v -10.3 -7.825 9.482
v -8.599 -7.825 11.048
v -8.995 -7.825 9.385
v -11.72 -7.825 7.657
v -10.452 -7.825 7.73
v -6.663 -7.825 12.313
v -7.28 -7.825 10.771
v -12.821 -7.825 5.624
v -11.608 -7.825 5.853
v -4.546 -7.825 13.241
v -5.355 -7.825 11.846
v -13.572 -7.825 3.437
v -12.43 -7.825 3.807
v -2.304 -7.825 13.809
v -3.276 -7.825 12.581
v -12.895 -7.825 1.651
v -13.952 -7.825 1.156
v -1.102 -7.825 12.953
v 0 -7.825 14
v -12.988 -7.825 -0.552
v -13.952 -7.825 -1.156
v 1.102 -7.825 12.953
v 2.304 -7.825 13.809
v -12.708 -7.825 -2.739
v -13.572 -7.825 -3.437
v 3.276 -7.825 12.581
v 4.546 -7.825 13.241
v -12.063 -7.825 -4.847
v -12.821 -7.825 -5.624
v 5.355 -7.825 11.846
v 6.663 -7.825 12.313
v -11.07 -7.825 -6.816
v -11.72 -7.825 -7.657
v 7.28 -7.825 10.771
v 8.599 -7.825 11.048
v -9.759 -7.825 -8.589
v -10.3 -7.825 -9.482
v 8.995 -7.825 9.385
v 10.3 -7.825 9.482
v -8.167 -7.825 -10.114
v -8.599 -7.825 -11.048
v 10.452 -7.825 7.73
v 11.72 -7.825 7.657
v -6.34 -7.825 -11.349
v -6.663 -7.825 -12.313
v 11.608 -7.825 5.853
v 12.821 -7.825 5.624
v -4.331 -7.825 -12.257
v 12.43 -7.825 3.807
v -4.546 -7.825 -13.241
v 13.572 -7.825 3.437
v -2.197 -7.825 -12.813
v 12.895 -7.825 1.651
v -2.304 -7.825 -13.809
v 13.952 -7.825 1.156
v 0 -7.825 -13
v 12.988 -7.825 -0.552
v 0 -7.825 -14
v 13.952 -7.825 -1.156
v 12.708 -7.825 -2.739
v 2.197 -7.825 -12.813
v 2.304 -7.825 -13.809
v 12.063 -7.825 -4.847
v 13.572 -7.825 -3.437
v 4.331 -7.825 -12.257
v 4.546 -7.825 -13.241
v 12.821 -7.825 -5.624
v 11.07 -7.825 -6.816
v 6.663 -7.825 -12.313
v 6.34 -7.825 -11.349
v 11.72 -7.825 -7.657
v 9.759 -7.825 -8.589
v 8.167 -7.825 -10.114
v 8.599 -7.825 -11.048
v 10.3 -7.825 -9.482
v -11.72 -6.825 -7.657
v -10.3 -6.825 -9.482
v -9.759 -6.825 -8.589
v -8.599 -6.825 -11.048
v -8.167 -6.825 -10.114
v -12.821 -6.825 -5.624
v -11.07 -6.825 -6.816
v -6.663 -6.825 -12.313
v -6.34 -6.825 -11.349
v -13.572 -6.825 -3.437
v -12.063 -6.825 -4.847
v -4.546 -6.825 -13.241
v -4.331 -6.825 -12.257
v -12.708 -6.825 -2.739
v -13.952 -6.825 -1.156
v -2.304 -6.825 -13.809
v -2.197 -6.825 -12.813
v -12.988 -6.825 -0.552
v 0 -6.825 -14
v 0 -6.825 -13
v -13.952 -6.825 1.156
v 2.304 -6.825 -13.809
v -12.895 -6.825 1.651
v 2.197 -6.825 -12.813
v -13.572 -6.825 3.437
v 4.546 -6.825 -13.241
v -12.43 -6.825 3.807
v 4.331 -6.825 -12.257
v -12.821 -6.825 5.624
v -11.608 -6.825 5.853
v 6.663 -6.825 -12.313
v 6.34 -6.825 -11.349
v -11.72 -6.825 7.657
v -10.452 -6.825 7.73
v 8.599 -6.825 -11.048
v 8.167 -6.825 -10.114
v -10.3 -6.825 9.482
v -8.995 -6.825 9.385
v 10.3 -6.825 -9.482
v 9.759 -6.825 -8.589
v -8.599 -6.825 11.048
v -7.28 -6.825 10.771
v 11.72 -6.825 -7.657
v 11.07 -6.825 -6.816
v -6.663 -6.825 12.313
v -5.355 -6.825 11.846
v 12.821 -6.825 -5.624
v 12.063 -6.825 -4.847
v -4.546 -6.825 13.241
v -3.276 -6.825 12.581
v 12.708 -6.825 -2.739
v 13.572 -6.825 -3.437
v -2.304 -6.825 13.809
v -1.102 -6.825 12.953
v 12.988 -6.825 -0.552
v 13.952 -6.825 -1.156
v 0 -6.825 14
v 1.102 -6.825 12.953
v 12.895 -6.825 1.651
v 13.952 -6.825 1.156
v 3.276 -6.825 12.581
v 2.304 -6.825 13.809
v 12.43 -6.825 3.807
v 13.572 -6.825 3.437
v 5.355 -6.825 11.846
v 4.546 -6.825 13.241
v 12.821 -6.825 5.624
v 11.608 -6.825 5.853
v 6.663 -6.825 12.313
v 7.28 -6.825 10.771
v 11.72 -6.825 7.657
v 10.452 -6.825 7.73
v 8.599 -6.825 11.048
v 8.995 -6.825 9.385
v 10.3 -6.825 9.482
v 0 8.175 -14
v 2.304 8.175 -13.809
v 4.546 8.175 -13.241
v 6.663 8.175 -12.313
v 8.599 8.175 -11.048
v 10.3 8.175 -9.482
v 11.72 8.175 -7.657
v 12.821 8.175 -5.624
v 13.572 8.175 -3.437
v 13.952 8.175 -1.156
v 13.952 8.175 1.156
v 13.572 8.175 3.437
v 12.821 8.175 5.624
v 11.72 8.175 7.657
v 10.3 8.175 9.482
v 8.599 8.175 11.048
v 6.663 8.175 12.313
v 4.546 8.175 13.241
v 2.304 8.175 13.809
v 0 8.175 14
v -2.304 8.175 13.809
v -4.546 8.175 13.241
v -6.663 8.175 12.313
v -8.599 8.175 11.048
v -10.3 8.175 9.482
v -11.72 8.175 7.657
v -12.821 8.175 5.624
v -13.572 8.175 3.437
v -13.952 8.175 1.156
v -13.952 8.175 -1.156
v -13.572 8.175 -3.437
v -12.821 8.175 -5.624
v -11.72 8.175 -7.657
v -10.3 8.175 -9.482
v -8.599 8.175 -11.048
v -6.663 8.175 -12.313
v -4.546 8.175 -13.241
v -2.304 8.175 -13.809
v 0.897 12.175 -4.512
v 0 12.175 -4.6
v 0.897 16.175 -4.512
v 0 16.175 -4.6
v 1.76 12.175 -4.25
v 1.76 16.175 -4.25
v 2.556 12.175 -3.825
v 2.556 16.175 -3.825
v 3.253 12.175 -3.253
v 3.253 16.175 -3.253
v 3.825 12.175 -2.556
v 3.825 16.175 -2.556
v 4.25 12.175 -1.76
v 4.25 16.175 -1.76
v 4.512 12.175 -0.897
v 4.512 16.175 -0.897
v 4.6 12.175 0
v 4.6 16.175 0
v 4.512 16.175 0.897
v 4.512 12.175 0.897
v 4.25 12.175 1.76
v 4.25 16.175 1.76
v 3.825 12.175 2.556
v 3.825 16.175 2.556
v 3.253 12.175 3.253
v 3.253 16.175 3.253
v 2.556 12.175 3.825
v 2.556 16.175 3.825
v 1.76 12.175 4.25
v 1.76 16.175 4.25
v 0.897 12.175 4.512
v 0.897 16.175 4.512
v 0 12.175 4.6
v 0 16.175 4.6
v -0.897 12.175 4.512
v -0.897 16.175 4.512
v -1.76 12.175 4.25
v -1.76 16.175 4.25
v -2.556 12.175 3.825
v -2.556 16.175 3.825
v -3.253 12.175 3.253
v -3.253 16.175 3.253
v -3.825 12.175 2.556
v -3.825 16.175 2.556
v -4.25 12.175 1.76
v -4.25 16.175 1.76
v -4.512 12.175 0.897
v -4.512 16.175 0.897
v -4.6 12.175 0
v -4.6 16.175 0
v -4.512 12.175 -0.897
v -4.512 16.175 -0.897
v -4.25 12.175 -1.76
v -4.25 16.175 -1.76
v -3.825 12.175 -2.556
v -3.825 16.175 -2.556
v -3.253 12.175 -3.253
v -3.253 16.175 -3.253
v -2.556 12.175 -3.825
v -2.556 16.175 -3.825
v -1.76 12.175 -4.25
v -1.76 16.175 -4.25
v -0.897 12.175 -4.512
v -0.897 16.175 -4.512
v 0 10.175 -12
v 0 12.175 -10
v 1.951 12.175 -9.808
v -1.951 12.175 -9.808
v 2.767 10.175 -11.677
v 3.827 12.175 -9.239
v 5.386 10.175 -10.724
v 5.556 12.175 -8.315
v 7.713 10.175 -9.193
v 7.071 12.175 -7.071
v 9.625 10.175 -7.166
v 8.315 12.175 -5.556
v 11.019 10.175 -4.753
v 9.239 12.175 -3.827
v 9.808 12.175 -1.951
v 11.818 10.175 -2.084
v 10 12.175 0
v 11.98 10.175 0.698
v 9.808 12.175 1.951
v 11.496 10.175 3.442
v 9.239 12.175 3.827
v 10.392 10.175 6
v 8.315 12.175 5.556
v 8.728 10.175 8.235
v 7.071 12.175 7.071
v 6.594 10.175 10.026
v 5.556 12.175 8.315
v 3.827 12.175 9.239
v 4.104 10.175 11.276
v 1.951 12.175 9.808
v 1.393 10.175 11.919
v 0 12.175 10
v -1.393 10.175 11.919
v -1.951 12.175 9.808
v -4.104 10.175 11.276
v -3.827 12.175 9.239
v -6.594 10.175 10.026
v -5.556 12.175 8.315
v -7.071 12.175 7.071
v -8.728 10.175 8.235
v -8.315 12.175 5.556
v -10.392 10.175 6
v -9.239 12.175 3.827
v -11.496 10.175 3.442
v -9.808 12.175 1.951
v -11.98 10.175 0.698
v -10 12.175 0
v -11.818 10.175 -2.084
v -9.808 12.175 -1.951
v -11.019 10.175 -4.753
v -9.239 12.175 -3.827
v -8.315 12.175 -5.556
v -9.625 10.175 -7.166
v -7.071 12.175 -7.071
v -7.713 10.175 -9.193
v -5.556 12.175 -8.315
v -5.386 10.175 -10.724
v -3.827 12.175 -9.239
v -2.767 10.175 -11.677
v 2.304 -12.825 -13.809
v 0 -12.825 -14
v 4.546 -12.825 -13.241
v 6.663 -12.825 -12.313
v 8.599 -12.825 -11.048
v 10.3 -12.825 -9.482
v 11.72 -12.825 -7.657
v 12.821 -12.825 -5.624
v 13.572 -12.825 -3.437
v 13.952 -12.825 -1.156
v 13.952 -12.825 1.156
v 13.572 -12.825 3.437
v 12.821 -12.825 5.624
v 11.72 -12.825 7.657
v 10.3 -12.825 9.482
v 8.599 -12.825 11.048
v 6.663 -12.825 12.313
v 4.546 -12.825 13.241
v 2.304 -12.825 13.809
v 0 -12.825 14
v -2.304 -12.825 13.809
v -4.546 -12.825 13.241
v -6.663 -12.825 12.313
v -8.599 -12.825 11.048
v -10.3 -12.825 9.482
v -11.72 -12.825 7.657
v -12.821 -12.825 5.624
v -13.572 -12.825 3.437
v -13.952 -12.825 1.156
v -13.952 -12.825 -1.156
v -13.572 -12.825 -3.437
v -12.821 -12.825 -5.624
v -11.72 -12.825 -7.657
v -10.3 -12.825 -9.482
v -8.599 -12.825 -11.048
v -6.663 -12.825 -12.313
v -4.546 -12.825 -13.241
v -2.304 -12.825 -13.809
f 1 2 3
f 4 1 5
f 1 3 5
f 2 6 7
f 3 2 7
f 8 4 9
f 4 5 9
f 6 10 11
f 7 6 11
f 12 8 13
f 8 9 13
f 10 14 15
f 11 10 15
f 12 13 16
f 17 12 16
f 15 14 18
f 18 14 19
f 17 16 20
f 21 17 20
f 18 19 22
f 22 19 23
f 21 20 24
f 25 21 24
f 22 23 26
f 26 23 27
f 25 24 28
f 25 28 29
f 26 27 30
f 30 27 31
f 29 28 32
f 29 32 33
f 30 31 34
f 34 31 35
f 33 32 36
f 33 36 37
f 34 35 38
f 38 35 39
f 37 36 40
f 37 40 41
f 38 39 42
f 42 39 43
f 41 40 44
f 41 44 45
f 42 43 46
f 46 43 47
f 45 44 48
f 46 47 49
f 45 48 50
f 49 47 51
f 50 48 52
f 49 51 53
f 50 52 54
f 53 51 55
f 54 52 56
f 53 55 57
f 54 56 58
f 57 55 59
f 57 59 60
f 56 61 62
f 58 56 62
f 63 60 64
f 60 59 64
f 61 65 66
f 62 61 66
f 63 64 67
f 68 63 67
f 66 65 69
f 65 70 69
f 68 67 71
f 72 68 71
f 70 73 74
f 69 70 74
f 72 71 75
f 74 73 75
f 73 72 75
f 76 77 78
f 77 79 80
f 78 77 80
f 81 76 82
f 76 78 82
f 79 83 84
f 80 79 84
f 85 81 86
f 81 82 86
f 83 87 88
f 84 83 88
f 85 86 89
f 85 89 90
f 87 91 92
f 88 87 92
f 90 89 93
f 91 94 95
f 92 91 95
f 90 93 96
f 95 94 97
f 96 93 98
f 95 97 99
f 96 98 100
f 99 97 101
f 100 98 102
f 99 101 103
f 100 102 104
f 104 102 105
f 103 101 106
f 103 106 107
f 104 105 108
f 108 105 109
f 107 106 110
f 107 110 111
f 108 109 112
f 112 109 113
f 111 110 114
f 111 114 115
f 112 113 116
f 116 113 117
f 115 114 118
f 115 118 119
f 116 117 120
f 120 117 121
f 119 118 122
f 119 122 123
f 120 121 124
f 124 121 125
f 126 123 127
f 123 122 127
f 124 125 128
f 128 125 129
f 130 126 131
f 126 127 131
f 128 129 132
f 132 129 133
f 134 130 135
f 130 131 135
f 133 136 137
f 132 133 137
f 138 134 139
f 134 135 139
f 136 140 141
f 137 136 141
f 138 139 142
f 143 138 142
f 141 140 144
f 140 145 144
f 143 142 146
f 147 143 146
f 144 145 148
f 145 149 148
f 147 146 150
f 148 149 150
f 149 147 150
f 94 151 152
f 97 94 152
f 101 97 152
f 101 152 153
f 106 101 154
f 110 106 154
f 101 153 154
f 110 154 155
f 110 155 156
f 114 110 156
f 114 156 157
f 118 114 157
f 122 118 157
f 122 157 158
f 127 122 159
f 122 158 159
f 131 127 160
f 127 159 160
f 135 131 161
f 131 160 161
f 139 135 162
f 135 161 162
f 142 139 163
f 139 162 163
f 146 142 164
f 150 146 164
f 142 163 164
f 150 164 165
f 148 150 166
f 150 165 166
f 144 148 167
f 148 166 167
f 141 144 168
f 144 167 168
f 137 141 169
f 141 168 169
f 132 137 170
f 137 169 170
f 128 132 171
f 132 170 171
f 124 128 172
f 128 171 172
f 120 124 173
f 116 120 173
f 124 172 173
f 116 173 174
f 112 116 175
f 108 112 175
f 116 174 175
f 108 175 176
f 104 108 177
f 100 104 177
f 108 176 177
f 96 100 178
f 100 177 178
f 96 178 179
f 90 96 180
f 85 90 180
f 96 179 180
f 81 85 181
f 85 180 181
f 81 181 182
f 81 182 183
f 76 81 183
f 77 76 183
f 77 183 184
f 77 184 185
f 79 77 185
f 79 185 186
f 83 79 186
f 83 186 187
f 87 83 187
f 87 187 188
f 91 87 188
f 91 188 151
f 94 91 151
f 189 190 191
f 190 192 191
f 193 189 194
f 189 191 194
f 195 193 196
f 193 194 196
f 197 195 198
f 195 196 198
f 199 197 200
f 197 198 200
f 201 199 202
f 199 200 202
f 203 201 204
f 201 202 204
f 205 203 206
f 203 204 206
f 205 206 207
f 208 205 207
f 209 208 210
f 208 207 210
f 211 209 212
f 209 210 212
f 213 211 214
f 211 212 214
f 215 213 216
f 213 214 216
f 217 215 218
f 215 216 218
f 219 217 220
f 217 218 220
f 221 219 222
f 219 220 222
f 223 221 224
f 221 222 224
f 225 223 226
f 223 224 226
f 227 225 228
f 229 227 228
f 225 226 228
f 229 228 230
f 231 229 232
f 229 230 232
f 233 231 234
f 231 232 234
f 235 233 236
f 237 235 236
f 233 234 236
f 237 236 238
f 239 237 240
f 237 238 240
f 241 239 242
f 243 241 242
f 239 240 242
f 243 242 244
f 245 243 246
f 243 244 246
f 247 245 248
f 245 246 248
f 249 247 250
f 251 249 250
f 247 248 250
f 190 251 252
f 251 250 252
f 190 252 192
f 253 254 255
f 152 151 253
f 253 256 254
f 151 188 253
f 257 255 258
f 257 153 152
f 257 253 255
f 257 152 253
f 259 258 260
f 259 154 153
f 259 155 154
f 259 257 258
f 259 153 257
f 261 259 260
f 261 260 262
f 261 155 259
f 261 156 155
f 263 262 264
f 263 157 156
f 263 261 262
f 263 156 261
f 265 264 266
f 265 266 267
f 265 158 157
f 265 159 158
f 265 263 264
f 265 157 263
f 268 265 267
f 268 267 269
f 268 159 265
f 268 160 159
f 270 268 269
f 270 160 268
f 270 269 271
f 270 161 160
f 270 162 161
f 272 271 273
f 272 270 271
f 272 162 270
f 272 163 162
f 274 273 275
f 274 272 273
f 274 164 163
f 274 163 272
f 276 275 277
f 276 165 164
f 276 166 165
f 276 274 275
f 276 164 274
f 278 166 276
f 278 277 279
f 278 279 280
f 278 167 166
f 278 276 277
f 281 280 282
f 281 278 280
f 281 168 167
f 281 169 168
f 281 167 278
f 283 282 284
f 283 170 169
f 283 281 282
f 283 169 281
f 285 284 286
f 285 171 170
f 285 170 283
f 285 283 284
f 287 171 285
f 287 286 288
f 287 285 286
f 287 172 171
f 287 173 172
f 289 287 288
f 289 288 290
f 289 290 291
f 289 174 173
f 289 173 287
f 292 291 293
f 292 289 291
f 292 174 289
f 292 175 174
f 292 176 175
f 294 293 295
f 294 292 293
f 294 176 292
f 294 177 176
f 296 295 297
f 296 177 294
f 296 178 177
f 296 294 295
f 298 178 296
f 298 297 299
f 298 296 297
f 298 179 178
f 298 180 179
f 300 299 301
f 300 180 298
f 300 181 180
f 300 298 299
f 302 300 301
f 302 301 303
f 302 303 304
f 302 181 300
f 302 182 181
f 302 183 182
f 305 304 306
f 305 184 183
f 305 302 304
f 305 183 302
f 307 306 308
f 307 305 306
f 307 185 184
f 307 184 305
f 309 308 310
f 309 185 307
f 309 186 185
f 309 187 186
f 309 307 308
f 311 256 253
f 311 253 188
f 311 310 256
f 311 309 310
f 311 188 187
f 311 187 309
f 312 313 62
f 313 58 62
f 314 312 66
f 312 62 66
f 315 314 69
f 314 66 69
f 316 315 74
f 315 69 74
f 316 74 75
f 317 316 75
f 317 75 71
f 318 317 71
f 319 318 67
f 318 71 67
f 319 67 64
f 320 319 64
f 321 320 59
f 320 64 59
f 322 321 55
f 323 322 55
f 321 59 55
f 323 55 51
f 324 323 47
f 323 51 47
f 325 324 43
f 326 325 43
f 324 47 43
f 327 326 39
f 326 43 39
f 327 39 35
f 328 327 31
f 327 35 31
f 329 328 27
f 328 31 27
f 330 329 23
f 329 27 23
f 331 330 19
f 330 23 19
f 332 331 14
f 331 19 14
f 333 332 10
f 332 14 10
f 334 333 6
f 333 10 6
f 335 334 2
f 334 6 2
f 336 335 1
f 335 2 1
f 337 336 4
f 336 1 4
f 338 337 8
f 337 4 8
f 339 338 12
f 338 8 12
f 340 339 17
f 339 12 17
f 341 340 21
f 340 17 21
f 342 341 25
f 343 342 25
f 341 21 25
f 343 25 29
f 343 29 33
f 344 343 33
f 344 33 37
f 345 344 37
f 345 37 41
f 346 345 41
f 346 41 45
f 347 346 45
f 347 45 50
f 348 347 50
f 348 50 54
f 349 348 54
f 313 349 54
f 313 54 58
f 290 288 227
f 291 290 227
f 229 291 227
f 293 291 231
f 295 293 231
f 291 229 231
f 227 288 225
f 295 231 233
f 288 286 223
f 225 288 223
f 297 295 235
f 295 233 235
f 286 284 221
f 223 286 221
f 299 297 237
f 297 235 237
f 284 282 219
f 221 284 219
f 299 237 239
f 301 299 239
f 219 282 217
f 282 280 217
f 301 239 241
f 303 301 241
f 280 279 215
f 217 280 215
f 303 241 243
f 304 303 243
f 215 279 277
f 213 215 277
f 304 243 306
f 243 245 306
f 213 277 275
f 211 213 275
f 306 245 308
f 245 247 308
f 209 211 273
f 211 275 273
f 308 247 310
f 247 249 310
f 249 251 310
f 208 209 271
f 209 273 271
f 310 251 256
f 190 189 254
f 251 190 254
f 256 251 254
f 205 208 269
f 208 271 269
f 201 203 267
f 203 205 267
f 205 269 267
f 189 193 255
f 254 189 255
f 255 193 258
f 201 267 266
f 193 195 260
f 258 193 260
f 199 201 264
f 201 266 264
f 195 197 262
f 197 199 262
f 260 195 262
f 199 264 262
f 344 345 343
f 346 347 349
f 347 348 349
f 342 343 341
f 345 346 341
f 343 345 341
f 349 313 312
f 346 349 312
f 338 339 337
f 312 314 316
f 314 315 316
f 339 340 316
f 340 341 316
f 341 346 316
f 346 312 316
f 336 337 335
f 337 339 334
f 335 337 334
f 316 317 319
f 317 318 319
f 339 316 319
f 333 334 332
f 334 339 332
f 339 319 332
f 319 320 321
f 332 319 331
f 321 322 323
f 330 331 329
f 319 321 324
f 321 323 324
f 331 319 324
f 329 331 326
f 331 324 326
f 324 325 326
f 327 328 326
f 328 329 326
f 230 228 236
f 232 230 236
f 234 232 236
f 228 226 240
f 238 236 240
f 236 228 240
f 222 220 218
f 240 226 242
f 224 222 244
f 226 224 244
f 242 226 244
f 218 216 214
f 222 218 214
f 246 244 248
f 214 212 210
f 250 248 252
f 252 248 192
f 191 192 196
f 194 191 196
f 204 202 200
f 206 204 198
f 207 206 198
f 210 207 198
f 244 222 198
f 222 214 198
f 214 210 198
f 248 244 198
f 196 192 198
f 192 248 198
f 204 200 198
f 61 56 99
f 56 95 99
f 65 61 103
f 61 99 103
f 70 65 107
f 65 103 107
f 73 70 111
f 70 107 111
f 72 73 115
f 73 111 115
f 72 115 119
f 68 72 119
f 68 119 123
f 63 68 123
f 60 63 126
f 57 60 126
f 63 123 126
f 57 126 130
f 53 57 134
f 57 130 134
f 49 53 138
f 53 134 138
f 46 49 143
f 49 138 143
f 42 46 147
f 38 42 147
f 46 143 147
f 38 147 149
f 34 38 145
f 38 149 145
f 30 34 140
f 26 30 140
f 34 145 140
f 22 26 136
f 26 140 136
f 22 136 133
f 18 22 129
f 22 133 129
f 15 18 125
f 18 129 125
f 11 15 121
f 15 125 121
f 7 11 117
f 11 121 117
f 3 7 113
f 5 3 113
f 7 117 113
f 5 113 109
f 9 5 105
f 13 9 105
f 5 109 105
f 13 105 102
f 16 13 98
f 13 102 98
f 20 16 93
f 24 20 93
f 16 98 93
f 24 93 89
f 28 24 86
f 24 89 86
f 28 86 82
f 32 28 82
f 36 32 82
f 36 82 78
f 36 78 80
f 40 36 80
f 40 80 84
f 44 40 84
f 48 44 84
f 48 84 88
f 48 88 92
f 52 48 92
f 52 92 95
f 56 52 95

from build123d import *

# Parameters (mm, degrees)
CHAMFER1_SIZE = 4


with BuildPart() as part:
    # Sketch1 → Revolve1 (revolve)
    with BuildSketch(Plane(origin=(0, 0, 0), x_dir=(0, 0, -1), z_dir=(1, 0, 0))):
        Polygon((14, 12.175), (4.6, 12.175), (4.6, 16.175), (0, 16.175), (0, 12.175), (0, -12.825), (14, -12.825), (14, -7.825), (13, -7.825), (13, -6.825), (14, -6.825), align=None)
    revolve(axis=Axis((0, 12.175, 0), (0, -1, 0)))

    # Chamfer1
    chamfer1_edges = [part.edges().sort_by_distance(p)[0] for p in [
        (0, 12.175, 14),
    ]]
    chamfer(chamfer1_edges, length=CHAMFER1_SIZE)


solid = part.part
